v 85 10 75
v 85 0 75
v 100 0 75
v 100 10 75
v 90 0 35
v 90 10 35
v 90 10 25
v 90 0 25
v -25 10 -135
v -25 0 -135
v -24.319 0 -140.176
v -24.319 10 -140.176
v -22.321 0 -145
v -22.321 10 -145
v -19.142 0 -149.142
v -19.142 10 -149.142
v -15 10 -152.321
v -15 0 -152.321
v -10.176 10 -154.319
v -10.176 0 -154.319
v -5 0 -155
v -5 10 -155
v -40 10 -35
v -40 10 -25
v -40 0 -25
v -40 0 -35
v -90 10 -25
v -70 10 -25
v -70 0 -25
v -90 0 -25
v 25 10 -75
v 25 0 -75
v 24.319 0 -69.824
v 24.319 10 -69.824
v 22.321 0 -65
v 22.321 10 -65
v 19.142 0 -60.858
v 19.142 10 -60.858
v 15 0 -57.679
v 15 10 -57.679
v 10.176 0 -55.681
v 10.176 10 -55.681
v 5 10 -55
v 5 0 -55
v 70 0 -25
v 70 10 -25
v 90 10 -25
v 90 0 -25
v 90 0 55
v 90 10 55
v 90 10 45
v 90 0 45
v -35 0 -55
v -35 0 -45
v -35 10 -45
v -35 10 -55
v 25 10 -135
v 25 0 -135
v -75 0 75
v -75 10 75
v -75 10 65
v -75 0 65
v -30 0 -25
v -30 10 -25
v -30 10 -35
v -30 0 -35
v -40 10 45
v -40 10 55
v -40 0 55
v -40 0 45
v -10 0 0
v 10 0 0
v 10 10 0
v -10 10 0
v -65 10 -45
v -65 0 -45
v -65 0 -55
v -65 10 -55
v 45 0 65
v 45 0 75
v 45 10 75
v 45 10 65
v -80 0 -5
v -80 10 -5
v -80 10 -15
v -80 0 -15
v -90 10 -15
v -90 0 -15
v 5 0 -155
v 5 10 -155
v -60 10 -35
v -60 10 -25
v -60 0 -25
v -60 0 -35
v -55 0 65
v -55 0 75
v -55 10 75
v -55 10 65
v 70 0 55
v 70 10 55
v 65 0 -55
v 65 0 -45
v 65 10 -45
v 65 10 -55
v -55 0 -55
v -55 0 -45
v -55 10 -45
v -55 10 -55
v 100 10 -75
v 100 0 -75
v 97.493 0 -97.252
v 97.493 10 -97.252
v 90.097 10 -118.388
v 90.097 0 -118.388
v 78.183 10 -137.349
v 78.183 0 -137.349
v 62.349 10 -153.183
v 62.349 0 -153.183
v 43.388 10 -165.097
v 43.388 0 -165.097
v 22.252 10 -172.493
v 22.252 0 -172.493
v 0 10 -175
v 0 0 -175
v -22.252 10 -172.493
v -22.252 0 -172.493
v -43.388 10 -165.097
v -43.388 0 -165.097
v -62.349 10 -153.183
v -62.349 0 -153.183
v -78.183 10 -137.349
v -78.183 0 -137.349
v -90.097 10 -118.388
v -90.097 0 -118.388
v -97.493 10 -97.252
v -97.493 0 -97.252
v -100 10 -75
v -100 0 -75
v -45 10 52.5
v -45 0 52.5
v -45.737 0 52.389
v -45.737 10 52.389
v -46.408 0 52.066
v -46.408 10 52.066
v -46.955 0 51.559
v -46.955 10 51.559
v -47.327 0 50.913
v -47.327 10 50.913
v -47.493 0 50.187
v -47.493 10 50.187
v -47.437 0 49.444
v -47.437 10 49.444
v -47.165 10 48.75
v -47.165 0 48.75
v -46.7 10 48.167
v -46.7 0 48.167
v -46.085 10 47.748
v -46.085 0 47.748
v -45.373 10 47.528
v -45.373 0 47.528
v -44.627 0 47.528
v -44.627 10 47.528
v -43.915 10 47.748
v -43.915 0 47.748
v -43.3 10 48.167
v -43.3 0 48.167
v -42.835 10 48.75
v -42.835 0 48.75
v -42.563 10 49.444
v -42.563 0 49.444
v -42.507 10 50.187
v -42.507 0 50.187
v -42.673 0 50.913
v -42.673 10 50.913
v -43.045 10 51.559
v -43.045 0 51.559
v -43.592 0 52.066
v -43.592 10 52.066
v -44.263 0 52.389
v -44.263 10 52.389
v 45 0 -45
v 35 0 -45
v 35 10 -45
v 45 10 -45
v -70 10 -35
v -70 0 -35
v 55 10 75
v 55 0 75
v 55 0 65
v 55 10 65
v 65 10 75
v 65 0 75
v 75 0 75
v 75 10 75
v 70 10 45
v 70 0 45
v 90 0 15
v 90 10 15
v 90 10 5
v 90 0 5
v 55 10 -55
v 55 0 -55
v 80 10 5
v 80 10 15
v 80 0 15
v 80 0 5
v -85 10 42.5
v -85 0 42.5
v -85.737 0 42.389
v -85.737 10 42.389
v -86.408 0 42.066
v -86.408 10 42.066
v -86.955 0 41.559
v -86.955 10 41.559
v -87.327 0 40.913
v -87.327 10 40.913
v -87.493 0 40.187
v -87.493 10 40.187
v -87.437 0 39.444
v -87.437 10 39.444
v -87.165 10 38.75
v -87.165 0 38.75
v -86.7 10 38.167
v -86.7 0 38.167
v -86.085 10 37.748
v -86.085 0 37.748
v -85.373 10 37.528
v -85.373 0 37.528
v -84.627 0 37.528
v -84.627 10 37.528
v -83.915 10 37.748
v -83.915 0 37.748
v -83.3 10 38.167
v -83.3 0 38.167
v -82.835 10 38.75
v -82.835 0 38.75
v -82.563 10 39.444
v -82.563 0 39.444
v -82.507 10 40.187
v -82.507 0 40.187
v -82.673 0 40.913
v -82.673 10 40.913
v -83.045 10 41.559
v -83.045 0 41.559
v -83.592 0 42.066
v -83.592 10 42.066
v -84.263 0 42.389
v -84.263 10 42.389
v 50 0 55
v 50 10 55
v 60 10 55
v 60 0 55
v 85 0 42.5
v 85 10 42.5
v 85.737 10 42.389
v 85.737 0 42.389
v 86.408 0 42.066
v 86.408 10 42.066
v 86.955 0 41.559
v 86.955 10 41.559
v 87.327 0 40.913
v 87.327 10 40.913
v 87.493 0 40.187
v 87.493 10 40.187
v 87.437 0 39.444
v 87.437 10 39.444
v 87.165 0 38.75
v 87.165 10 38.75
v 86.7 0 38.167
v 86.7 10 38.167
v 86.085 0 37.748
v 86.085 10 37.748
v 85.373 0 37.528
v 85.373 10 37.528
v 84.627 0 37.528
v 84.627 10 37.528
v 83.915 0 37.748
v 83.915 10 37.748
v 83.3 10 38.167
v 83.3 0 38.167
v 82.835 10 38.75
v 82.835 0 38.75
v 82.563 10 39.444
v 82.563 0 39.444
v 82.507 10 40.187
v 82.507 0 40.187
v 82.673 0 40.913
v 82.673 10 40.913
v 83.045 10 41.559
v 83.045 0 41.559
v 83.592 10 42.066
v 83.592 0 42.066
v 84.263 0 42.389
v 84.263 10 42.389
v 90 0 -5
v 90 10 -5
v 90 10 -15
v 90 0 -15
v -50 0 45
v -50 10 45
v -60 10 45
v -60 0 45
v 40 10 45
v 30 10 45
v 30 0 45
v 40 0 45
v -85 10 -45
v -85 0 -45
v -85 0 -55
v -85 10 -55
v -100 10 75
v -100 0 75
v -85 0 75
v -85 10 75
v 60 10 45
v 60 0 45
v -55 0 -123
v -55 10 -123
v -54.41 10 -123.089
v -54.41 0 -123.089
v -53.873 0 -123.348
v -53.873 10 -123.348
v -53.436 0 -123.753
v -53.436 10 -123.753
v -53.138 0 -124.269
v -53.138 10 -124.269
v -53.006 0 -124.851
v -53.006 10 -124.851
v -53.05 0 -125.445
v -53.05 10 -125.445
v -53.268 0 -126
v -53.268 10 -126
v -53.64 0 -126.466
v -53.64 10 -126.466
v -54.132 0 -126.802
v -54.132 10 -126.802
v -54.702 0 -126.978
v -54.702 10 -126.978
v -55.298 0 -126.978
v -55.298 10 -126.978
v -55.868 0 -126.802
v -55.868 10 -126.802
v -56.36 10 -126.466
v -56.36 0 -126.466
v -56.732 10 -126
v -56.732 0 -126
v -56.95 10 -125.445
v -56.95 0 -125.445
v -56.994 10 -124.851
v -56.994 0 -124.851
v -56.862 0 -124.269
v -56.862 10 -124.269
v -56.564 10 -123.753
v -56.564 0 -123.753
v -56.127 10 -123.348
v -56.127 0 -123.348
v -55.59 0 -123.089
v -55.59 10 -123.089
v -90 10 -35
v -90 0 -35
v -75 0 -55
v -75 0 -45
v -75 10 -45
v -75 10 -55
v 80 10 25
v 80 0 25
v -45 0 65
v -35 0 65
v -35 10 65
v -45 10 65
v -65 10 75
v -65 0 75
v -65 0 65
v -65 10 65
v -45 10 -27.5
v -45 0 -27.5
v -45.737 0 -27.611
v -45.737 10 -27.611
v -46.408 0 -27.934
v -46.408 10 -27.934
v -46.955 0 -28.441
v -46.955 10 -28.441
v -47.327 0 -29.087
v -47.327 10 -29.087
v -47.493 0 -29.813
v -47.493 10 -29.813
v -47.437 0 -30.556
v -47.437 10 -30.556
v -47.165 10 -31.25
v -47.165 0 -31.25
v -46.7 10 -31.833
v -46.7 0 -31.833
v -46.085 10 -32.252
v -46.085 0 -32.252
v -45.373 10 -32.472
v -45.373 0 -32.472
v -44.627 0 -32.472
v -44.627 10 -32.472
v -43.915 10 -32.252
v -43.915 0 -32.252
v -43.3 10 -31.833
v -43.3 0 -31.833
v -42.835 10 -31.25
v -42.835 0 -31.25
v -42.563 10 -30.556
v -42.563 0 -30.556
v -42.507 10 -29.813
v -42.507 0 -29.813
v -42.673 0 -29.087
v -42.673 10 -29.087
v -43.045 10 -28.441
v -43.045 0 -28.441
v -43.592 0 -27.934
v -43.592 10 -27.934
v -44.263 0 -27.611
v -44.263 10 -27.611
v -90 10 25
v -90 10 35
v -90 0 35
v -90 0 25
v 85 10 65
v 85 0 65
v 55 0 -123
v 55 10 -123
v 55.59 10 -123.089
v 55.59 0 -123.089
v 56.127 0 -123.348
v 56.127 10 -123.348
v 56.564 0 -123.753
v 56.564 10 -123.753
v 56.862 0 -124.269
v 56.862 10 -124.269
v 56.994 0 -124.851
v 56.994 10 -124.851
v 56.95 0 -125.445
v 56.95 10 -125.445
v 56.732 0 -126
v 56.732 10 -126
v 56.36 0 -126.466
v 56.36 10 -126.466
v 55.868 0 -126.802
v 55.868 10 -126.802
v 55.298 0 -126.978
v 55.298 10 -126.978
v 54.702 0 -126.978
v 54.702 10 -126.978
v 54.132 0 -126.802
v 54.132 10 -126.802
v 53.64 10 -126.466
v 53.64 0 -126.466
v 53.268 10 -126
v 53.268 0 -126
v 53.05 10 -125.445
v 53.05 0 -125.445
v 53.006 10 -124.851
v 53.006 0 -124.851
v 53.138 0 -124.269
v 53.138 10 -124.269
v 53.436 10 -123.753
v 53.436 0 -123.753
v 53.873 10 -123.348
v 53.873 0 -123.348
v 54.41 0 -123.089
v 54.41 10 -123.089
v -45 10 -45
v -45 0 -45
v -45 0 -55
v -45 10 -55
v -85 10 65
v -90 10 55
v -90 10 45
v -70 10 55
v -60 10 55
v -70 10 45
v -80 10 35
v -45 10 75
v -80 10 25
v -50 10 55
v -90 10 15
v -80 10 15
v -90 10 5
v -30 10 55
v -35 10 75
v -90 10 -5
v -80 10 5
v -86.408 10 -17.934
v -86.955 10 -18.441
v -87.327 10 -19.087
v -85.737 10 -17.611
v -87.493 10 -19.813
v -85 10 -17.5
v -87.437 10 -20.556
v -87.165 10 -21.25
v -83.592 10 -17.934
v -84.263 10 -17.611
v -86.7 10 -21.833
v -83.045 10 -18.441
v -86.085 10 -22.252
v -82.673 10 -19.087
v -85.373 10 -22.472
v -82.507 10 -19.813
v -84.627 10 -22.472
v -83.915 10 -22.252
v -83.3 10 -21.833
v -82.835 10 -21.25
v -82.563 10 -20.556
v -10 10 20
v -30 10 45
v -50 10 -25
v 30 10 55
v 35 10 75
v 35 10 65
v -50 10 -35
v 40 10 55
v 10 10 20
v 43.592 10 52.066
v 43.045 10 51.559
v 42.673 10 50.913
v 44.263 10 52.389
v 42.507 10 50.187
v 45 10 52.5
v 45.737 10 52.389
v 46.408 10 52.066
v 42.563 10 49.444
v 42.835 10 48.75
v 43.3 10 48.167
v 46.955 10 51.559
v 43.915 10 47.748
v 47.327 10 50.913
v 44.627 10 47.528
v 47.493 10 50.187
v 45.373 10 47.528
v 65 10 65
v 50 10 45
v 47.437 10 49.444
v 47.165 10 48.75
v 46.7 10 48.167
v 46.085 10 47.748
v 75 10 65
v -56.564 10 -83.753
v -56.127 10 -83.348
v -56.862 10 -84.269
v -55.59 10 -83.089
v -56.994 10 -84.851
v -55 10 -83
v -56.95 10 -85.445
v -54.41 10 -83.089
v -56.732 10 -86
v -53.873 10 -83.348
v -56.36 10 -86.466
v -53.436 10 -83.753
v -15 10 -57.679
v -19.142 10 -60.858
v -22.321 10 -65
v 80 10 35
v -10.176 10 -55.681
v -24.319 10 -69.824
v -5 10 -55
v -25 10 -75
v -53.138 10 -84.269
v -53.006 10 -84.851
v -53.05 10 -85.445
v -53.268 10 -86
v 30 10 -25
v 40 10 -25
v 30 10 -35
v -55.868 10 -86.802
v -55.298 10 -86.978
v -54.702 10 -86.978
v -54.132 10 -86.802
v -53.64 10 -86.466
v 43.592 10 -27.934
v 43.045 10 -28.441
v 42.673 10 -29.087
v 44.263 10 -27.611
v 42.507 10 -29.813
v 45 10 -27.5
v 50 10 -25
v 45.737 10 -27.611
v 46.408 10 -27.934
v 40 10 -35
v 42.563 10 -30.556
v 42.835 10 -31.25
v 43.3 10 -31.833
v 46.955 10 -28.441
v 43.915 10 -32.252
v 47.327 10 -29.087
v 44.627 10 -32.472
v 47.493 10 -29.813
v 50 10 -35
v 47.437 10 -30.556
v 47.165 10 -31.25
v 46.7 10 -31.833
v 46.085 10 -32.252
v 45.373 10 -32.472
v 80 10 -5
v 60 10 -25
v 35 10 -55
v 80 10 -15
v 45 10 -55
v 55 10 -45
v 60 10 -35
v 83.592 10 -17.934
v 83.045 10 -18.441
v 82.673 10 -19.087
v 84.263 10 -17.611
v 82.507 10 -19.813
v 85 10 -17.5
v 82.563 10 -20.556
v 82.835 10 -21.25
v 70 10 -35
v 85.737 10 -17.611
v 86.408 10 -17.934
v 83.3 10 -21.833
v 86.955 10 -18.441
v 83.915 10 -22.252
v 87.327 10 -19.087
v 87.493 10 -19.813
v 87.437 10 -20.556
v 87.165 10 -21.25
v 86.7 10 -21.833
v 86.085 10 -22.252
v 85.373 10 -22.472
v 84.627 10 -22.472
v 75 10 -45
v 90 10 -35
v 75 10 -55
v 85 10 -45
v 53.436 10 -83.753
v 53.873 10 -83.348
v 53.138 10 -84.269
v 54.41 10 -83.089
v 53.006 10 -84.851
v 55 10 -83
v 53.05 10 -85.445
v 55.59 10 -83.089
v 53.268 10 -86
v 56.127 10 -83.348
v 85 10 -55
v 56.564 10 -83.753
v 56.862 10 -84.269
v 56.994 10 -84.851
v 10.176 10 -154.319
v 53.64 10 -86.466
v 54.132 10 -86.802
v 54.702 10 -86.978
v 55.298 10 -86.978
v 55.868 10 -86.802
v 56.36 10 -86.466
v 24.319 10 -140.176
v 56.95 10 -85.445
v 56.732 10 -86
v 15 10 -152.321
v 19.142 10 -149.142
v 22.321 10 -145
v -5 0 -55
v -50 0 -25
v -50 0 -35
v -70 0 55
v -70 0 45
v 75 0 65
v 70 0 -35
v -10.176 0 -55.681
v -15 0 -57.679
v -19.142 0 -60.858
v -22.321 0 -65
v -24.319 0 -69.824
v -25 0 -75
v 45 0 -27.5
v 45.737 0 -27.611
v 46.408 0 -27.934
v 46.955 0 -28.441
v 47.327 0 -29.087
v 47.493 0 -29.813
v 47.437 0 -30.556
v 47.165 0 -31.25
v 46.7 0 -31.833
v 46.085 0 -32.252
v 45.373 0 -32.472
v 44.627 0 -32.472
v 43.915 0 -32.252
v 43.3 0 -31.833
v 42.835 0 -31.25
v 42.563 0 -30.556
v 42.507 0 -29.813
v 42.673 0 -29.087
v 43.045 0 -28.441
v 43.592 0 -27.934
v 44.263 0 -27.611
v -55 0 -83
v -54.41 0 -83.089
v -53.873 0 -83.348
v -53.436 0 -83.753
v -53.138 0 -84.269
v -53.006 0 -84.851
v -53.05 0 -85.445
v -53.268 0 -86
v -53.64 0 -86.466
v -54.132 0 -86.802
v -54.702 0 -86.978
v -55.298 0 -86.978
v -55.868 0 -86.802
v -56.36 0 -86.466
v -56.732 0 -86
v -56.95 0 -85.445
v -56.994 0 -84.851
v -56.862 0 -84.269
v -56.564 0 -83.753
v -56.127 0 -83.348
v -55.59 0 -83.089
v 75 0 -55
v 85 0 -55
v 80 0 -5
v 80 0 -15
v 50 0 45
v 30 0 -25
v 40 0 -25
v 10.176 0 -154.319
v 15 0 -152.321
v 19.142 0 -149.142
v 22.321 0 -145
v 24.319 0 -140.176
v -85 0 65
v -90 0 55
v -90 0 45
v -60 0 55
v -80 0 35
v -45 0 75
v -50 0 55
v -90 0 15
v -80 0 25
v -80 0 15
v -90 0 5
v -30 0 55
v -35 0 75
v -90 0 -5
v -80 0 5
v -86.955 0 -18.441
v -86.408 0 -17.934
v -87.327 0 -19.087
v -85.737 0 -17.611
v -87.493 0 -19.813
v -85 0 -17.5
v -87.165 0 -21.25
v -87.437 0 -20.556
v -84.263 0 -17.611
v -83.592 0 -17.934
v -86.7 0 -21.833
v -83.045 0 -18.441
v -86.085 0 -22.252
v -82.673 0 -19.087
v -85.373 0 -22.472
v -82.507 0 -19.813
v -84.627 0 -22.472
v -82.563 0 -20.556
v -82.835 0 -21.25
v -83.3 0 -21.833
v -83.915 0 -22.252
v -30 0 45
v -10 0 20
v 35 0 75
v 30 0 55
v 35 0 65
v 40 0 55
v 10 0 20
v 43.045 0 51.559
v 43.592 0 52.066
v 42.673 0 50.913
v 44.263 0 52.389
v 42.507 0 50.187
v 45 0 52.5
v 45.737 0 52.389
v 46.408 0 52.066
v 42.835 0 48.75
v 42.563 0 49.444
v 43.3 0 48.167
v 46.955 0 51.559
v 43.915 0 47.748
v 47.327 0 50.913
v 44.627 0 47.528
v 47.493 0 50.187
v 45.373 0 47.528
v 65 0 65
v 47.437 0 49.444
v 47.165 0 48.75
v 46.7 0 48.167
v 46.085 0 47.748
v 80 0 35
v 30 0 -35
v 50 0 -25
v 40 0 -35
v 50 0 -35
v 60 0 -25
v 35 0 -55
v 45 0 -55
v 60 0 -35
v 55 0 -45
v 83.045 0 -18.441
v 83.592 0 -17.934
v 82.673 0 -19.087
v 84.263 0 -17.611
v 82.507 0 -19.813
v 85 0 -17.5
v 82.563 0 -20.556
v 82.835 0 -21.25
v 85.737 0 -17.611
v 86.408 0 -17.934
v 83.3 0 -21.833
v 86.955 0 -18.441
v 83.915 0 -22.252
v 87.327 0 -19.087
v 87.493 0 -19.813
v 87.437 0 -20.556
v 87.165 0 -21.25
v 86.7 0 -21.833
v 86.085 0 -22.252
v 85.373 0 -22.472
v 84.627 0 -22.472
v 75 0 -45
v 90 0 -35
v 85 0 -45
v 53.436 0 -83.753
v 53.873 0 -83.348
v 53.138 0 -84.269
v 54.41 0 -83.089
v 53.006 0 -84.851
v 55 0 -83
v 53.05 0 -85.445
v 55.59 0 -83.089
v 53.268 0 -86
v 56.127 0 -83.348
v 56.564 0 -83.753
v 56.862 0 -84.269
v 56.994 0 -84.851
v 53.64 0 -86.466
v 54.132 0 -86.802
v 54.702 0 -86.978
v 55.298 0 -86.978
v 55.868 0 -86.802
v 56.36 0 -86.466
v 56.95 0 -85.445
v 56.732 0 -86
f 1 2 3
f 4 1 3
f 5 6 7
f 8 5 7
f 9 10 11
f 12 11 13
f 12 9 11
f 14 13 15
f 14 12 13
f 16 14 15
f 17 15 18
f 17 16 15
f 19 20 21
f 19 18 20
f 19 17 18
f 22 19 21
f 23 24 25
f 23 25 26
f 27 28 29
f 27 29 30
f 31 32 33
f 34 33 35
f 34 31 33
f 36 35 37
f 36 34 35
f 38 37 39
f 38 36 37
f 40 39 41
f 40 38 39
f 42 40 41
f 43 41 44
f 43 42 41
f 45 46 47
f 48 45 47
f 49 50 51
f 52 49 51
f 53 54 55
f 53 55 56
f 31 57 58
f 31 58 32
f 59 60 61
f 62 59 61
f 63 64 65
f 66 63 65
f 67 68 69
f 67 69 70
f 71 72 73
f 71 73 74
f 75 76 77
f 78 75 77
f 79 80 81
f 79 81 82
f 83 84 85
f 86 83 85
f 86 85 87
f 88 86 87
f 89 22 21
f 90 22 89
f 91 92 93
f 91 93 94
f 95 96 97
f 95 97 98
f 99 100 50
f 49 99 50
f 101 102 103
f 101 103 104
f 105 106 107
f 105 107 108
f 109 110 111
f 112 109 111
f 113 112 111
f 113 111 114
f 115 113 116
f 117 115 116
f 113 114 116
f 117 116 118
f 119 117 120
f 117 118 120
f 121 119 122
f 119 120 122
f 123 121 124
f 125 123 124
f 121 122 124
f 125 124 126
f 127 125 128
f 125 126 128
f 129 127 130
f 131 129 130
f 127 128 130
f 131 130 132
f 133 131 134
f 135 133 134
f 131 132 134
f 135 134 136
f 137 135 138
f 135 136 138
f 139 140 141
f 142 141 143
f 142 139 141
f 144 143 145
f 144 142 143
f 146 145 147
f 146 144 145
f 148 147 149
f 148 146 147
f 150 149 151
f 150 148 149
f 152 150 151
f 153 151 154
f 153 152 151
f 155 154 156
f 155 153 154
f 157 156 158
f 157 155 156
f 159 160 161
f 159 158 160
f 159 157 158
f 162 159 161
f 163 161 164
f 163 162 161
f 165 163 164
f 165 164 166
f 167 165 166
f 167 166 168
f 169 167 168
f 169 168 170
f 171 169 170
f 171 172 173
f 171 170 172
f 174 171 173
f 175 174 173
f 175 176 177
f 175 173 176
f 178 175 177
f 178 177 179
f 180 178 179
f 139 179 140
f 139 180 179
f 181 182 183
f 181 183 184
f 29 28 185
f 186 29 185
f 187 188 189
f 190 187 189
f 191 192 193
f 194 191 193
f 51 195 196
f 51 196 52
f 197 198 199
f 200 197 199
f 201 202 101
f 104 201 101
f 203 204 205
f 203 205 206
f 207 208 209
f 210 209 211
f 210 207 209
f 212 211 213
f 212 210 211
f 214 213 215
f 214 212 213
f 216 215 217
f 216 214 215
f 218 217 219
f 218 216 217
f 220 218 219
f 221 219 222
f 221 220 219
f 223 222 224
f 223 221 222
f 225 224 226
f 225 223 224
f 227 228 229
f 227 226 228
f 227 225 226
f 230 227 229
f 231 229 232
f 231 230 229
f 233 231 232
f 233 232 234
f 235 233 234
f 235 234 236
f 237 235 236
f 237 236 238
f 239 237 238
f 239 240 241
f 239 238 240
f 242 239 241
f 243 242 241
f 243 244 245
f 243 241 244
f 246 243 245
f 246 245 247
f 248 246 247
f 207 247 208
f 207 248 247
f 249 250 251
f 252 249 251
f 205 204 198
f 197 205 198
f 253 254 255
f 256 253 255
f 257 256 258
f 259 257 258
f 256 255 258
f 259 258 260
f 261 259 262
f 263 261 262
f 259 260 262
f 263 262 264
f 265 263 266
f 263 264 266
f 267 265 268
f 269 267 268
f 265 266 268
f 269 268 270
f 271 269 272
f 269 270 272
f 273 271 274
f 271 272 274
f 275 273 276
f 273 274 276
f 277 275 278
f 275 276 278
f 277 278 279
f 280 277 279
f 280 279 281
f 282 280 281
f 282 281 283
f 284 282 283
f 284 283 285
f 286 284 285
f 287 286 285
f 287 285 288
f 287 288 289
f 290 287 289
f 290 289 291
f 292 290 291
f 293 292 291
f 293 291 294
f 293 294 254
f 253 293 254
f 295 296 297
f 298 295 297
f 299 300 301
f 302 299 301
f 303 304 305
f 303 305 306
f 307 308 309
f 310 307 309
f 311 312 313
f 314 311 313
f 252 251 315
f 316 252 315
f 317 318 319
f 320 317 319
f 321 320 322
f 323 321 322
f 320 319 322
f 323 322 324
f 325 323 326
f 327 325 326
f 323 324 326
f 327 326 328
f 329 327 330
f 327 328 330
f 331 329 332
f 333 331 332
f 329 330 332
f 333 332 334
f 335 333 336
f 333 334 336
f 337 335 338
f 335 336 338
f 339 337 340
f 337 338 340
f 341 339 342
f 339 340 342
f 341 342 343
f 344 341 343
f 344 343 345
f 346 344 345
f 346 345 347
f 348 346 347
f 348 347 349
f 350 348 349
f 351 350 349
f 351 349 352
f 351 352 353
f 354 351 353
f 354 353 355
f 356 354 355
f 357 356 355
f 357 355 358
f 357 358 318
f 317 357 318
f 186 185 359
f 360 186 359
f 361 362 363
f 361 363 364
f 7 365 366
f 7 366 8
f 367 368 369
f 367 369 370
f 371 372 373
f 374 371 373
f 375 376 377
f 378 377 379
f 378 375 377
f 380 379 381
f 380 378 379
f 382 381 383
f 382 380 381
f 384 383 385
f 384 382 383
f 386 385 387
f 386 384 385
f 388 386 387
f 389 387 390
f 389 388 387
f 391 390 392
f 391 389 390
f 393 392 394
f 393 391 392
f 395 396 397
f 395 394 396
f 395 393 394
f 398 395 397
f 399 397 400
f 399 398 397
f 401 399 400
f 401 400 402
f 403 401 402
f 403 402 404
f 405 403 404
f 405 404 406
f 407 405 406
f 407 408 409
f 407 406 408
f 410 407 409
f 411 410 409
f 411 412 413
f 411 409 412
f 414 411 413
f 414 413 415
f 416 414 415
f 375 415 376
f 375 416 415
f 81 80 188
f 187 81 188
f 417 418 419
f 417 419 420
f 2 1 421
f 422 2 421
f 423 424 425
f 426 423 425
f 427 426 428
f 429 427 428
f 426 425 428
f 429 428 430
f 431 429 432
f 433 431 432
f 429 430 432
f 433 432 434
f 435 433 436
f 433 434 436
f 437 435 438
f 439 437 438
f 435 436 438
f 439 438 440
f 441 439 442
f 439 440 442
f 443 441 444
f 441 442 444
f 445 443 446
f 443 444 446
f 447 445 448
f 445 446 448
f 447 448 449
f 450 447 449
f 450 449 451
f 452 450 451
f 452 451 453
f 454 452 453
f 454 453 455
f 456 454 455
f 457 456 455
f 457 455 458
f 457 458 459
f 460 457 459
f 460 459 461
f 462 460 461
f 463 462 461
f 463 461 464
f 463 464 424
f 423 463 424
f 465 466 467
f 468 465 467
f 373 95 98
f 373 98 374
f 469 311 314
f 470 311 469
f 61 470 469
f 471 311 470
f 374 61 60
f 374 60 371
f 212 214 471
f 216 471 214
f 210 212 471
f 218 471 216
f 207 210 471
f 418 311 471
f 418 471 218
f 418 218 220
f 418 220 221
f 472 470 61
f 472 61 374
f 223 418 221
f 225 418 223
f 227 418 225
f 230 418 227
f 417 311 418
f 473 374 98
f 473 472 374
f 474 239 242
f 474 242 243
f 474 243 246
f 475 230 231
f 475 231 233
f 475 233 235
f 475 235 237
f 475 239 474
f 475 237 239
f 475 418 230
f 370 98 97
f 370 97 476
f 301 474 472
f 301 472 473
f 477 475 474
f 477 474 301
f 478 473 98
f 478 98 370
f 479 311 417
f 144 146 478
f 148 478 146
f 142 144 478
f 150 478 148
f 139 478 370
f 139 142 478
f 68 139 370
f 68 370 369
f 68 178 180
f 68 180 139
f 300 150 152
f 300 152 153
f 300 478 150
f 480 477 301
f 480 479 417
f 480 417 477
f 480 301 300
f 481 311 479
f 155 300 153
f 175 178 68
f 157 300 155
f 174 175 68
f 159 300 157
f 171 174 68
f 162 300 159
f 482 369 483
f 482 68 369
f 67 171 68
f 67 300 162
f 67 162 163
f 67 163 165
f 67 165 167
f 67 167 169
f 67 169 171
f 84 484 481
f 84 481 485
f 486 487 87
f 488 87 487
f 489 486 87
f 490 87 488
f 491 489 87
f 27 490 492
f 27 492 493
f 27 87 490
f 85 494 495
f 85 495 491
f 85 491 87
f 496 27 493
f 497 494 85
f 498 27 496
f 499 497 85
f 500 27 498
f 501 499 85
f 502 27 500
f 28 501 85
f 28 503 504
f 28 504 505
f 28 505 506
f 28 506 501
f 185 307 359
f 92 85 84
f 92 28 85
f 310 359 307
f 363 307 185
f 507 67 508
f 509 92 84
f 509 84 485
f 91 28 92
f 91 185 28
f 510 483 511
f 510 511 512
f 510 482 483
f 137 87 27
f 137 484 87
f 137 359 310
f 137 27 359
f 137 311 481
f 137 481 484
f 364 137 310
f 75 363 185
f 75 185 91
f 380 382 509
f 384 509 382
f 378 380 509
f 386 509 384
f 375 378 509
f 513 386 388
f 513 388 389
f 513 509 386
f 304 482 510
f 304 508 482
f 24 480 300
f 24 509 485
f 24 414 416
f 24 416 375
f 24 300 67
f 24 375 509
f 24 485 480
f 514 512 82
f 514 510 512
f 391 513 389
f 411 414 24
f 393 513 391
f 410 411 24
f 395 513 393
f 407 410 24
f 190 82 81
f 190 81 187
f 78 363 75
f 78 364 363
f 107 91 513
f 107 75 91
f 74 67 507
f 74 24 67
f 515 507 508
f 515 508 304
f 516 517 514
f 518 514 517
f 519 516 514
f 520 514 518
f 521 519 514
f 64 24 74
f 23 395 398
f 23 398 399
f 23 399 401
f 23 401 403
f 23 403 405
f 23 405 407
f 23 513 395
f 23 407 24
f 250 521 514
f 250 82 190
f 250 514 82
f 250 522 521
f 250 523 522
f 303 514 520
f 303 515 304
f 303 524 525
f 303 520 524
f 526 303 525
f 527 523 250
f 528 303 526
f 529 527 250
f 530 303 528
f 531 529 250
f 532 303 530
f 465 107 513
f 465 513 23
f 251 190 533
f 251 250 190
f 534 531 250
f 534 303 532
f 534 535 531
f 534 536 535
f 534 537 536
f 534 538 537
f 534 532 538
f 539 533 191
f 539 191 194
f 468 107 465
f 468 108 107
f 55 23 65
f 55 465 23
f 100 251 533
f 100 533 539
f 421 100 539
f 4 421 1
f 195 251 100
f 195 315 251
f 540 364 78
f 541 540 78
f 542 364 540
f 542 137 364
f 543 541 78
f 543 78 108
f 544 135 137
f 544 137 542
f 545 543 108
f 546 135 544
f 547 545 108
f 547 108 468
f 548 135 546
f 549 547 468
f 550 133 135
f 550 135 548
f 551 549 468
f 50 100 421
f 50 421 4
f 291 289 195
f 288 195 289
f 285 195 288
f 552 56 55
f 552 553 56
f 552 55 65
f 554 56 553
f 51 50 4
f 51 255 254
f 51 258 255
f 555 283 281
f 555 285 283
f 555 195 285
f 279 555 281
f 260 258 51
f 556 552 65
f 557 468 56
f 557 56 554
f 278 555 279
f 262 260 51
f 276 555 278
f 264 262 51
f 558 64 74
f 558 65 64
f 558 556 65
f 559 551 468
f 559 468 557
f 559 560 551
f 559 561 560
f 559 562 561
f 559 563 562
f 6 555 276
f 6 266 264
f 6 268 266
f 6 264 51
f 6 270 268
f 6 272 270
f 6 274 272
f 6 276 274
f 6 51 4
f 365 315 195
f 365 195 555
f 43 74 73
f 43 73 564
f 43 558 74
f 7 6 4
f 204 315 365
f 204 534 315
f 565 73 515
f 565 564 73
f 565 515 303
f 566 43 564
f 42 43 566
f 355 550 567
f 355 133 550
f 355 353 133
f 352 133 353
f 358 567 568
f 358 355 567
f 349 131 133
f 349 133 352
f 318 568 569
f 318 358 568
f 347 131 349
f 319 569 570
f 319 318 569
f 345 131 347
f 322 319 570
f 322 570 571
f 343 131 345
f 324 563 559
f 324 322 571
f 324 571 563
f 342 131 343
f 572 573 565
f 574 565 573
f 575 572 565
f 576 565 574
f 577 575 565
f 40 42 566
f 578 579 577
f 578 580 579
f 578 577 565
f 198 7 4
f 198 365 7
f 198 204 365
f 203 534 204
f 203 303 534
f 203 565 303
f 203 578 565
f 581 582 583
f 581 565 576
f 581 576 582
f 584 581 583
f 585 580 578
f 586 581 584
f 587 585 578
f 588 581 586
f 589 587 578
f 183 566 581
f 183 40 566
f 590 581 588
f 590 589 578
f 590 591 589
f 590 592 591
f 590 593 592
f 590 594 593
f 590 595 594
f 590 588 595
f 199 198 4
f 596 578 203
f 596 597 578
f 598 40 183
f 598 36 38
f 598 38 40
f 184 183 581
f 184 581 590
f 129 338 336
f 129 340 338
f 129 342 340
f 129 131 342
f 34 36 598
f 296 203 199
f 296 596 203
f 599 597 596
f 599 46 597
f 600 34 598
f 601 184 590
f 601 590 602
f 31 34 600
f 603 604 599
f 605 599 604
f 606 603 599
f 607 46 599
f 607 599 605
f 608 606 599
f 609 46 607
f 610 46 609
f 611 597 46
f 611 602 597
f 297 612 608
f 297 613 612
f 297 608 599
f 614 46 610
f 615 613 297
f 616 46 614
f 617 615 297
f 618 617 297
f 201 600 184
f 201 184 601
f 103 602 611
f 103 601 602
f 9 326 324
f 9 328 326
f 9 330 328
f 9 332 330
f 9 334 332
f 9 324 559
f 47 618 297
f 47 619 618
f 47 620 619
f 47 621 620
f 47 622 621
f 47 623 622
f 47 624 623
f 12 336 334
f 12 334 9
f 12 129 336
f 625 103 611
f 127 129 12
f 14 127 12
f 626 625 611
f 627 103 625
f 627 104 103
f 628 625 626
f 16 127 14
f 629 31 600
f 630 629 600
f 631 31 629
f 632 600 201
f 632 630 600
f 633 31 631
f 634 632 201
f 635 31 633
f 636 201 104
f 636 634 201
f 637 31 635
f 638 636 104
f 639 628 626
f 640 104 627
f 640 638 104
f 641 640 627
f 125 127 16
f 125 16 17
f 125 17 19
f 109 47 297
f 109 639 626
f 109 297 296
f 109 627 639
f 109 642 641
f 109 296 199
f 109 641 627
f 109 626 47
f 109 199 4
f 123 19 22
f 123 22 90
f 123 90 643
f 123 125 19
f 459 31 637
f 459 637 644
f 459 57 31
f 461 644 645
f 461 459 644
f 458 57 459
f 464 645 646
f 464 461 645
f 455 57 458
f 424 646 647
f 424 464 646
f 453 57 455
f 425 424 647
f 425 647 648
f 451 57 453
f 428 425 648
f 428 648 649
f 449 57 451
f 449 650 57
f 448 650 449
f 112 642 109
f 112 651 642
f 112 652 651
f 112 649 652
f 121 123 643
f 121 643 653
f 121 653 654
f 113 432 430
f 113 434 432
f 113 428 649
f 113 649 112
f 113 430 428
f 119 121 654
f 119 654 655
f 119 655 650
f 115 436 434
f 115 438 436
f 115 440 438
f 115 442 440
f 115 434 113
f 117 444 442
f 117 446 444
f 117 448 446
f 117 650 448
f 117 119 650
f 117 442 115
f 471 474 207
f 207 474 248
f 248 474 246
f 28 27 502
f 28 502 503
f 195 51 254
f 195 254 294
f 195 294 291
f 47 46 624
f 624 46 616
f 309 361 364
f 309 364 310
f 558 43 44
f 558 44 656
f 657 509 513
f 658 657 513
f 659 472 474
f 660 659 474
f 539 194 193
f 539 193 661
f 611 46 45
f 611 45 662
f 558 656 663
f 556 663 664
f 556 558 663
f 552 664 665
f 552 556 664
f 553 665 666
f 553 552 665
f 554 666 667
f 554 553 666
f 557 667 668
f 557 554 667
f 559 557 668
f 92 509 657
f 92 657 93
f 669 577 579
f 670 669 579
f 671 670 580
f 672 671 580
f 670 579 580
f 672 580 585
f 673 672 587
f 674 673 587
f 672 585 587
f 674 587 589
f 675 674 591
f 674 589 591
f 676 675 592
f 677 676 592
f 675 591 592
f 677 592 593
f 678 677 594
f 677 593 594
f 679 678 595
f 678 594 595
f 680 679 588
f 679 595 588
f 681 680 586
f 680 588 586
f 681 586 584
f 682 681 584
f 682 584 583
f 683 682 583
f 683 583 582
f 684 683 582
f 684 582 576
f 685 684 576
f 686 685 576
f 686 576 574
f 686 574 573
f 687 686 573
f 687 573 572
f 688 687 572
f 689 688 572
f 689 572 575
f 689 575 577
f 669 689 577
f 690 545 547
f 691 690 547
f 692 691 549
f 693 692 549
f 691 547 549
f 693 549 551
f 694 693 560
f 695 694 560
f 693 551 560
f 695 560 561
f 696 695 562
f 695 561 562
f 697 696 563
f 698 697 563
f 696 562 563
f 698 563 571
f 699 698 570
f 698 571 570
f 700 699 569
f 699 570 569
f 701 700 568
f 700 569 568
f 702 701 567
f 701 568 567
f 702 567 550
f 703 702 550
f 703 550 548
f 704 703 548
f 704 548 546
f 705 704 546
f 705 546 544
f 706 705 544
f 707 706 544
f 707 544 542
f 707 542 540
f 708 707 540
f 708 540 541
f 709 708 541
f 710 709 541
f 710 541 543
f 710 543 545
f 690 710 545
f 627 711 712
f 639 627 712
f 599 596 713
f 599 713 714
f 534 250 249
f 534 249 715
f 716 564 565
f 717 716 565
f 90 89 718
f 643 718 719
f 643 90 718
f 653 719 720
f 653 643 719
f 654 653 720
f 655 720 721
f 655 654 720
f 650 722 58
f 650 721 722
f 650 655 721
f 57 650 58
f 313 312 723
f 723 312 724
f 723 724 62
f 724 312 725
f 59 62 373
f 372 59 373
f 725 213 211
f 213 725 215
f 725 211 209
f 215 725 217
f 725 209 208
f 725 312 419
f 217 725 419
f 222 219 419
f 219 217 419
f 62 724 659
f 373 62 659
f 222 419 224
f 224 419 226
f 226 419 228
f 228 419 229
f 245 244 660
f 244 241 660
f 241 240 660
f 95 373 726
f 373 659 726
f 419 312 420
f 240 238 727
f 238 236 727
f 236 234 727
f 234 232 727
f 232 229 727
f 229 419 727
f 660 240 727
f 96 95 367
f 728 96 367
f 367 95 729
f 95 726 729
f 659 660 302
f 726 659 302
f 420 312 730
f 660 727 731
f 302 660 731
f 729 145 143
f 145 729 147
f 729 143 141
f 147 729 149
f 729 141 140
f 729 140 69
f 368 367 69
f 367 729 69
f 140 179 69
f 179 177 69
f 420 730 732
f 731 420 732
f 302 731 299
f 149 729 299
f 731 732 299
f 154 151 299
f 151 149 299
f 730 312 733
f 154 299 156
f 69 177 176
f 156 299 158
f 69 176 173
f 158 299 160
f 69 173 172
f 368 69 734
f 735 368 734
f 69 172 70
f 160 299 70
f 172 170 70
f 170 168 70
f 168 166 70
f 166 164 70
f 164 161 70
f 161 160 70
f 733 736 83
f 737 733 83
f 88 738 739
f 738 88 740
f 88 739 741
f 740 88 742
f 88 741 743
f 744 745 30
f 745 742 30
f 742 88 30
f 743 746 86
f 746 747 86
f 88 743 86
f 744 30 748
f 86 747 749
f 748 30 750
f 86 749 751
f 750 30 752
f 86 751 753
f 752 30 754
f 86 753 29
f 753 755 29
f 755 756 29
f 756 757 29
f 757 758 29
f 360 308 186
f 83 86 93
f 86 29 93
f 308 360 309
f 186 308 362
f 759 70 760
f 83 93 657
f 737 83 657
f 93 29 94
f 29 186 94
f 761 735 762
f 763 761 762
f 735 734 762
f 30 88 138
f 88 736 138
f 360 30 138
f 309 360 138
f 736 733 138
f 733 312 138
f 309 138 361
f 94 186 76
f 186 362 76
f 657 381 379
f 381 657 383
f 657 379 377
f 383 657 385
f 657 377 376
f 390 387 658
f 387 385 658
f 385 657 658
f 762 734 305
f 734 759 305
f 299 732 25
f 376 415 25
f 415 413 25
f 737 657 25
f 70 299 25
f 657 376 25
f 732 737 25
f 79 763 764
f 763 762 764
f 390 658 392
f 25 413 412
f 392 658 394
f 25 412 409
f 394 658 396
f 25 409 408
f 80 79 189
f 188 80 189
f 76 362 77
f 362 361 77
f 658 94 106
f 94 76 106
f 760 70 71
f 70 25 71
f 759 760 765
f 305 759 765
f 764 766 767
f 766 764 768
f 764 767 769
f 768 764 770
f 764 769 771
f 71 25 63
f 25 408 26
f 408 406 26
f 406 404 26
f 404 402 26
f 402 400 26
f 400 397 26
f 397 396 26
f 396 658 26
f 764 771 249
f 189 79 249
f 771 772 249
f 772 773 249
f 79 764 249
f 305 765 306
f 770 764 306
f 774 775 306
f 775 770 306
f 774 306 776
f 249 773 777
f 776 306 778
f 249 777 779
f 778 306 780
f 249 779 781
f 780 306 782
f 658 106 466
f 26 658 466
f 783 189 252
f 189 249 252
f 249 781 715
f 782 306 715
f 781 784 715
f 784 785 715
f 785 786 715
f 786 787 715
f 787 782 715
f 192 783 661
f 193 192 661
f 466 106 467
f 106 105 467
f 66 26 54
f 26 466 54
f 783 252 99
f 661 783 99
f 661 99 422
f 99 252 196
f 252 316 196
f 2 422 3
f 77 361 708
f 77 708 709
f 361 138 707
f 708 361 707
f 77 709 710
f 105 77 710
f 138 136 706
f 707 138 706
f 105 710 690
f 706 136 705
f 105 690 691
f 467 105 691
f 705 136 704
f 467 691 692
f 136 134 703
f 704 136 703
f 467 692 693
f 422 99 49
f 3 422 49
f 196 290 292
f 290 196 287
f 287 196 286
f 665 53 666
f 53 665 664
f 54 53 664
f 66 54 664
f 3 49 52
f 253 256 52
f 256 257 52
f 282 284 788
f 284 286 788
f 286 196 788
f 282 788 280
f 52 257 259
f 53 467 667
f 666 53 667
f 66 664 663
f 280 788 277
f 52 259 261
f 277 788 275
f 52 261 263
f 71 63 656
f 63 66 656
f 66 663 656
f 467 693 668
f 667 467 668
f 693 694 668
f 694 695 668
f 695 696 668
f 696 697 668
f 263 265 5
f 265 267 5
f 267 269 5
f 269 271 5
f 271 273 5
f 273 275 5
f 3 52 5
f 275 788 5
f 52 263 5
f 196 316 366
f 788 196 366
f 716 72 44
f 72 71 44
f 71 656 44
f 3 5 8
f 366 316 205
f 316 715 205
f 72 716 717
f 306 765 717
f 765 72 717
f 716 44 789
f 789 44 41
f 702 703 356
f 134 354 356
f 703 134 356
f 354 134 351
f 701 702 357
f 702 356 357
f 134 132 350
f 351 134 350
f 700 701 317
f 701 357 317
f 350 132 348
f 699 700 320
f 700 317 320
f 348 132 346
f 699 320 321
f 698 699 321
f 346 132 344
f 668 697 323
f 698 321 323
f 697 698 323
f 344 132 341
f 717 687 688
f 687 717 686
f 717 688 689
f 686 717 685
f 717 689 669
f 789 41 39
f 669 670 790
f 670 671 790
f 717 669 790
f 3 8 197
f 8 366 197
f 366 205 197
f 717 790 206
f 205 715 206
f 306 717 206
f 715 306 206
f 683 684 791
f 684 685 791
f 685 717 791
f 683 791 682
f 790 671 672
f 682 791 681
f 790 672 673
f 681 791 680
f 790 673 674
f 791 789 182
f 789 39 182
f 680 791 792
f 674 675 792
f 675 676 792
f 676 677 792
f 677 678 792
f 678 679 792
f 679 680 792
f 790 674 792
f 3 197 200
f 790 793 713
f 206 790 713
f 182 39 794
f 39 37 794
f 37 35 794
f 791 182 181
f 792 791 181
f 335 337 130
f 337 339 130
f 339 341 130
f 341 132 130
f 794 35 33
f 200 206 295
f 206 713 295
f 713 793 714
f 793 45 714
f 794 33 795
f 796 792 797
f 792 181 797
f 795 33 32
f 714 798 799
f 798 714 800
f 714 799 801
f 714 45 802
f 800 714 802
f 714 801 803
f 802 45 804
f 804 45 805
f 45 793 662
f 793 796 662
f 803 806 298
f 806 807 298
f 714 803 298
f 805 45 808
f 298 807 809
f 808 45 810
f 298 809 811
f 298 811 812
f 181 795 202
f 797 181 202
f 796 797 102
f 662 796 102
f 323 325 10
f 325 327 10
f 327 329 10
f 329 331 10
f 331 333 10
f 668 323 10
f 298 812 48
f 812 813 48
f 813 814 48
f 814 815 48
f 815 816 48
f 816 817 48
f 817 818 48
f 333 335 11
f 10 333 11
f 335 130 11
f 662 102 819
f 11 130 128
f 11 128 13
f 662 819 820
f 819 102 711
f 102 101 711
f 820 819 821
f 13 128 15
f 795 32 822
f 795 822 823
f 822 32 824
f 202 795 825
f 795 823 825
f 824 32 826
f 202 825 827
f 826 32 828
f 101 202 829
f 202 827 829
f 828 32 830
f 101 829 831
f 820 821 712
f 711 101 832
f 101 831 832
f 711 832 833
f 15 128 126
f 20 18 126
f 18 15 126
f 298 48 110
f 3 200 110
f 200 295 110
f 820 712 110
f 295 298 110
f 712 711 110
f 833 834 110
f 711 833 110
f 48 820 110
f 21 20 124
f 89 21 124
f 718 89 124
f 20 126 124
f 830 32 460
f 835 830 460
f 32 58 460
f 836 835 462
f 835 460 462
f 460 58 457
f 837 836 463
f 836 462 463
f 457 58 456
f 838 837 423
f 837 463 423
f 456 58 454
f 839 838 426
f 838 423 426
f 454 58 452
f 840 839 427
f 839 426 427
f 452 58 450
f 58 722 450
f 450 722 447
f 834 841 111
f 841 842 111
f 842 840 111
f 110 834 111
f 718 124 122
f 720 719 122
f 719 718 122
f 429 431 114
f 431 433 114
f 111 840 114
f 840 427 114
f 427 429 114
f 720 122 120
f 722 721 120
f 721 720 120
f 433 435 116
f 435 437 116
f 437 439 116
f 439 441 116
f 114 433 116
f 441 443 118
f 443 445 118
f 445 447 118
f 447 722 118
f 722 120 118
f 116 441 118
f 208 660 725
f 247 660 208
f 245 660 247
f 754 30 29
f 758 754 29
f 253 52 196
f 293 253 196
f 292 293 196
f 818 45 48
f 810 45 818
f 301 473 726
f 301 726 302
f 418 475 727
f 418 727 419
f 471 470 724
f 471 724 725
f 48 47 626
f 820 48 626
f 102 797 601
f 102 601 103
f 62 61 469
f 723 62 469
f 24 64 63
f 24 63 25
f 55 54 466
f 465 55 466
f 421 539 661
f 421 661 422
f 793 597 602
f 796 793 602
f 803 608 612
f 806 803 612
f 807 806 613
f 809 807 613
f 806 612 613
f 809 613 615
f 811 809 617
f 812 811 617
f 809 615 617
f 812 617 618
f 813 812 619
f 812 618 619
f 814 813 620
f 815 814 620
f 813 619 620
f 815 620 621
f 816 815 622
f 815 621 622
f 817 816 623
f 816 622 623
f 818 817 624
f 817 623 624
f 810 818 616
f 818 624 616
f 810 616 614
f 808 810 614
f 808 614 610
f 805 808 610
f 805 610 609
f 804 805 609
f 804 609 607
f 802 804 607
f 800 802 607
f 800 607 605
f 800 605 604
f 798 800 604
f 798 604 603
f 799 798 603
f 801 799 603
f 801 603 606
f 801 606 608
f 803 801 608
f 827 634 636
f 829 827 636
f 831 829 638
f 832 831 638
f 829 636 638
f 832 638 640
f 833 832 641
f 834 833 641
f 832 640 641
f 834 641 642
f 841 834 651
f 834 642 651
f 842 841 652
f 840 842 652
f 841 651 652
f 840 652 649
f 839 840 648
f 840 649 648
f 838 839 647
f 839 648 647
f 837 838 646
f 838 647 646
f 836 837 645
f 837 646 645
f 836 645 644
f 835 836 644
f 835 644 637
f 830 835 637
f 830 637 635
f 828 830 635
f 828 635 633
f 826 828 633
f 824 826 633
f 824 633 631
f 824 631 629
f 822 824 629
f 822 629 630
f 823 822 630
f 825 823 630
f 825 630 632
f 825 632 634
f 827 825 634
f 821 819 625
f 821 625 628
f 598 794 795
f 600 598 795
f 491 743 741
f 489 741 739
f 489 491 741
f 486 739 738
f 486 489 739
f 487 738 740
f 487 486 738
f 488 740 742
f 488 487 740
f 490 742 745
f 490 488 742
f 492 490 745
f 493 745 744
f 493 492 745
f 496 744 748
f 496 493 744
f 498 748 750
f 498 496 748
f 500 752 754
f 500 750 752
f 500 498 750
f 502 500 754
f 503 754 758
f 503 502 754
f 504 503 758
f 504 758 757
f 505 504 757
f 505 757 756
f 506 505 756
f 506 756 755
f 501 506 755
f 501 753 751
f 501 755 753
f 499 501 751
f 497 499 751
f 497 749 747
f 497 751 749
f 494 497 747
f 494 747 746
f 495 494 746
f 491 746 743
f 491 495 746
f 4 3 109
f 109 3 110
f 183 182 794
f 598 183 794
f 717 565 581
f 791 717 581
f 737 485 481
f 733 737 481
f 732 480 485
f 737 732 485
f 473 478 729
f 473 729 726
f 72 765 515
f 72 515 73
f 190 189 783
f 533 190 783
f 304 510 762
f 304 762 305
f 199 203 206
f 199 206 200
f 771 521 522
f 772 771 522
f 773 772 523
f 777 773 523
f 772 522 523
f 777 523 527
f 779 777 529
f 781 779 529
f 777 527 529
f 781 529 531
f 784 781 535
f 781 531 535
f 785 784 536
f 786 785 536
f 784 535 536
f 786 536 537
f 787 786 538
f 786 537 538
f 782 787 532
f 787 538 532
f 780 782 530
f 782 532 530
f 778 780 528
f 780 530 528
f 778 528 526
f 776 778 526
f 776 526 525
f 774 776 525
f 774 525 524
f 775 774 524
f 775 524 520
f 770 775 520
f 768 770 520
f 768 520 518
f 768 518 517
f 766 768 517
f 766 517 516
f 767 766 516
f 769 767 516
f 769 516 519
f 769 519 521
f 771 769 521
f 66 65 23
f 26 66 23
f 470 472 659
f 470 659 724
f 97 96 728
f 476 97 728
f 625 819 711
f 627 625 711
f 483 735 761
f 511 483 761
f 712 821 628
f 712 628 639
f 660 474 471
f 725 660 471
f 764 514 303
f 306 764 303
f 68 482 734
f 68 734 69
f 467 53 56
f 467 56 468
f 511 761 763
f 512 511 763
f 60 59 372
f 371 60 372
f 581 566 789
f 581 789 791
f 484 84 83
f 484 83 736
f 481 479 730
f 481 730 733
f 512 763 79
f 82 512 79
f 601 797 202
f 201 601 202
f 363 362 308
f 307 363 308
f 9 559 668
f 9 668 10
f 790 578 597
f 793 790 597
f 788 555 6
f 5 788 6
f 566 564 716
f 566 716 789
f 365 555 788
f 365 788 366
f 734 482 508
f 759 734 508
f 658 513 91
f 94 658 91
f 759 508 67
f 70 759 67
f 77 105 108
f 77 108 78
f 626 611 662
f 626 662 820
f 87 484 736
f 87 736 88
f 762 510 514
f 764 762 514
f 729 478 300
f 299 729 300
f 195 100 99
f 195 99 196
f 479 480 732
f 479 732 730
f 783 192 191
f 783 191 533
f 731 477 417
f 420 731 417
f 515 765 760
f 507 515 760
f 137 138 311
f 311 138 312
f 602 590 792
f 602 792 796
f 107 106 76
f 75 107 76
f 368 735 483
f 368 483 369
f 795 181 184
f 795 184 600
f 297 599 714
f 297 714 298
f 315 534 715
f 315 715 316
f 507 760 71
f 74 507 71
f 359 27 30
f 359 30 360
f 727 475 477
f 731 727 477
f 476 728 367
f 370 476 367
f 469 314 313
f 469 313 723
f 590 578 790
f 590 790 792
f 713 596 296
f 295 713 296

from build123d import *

# Parameters (mm, degrees)
BOSS_EXTRUDE1_DEPTH = 10
SKETCH2_R           = 2.5
SKETCH2_W           = 10
SKETCH2_H           = 10
SKETCH2_W_2         = 20
CUT_EXTRUDE1_DEPTH  = 202.804360706
SKETCH4_R           = 2
CUT_EXTRUDE2_DEPTH  = 202.804360706
SKETCH5_W           = 10
SKETCH5_H           = 10
SKETCH5_H_2         = 20
CUT_EXTRUDE3_DEPTH  = 202.804360706


with BuildPart() as part:
    # Sketch3 → Boss-Extrude1 (new body)
    with BuildSketch(Plane(origin=(0, 0, 0), x_dir=(1, 0, 0), z_dir=(0, 1, 0))):
        with BuildLine():
            Line((-100, -75), (100, -75))
            Line((100, -75), (100, 75))
            ThreePointArc((100, 75), (0, 175), (-100, 75))
            Line((-100, 75), (-100, -75))
        make_face()
    extrude(amount=BOSS_EXTRUDE1_DEPTH)

    # Sketch2 → Cut-Extrude1 (cut, through all)
    with BuildSketch(Plane(origin=(0, 10, 0), x_dir=(1, 0, 0), z_dir=(0, 1, 0))):
        with Locations(Location((45, 30, 0), (0, 0, 270))):
            Circle(SKETCH2_R)
        with Locations(Location((45, -50, 0), (0, 0, 270))):
            Circle(SKETCH2_R)
        with Locations(Location((85, -40, 0), (0, 0, 270))):
            Circle(SKETCH2_R)
        with Locations(Location((85, 20, 0), (0, 0, 270))):
            Circle(SKETCH2_R)
        with Locations((35, -50)):
            Rectangle(SKETCH2_W, SKETCH2_H)
        with Locations((55, -50)):
            Rectangle(SKETCH2_W, SKETCH2_H)
        with Locations((80, -50)):
            Rectangle(SKETCH2_W_2, SKETCH2_H)
        with Locations((85, -30)):
            Rectangle(SKETCH2_W, SKETCH2_H)
        with Locations((85, -10)):
            Rectangle(SKETCH2_W, SKETCH2_H)
        with Locations((85, 10)):
            Rectangle(SKETCH2_W, SKETCH2_H)
        with Locations((80, 30)):
            Rectangle(SKETCH2_W_2, SKETCH2_H)
        with Locations((55, 30)):
            Rectangle(SKETCH2_W, SKETCH2_H)
        with Locations((35, 30)):
            Rectangle(SKETCH2_W, SKETCH2_H)
    cut_extrude1 = extrude(amount=-CUT_EXTRUDE1_DEPTH, mode=Mode.SUBTRACT)

    # Mirror1: Cut-Extrude1 across plane
    add(cut_extrude1.mirror(Plane(origin=(0, 0, 0), x_dir=(0, 0, 1), z_dir=(1, 0, 0))), mode=Mode.SUBTRACT)

    # Sketch4 → Cut-Extrude2 (cut, through all)
    with BuildSketch(Plane(origin=(0, 10, 0), x_dir=(1, 0, 0), z_dir=(0, 1, 0))):
        with Locations(Location((55, 125, 0), (0, 0, 270))):
            Circle(SKETCH4_R)
        with Locations(Location((55, 85, 0), (0, 0, 270))):
            Circle(SKETCH4_R)
        with Locations(Location((-55, 125, 0), (0, 0, 270))):
            Circle(SKETCH4_R)
        with Locations(Location((-55, 85, 0), (0, 0, 270))):
            Circle(SKETCH4_R)
        with BuildLine():
            Line((-5, 155), (5, 155))
            ThreePointArc((5, 155), (19.142135624, 149.142135624), (25, 135))
            Line((25, 135), (25, 75))
            ThreePointArc((25, 75), (19.142135624, 60.857864376), (5, 55))
            Line((5, 55), (-5, 55))
            ThreePointArc((-5, 55), (-19.142135624, 60.857864376), (-25, 75))
            Line((-25, 75), (-25, 135))
            ThreePointArc((-25, 135), (-19.142135624, 149.142135624), (-5, 155))
        make_face()
    extrude(amount=-CUT_EXTRUDE2_DEPTH, mode=Mode.SUBTRACT)

    # Sketch5 → Cut-Extrude3 (cut, symmetric)
    with BuildSketch(Plane(origin=(0, 10, 0), x_dir=(1, 0, 0), z_dir=(0, 1, 0))):
        with Locations((80, 50)):
            Rectangle(SKETCH5_W, SKETCH5_H)
        with Locations((60, 50)):
            Rectangle(SKETCH5_W, SKETCH5_H)
        with Locations((40, 50)):
            Rectangle(SKETCH5_W, SKETCH5_H)
        with Locations((5, -10)):
            Rectangle(SKETCH5_W, SKETCH5_H_2)
        with Locations((40, -70)):
            Rectangle(SKETCH5_W, SKETCH5_H)
        with Locations((60, -70)):
            Rectangle(SKETCH5_W, SKETCH5_H)
        with Locations((80, -70)):
            Rectangle(SKETCH5_W, SKETCH5_H)
    cut_extrude3 = extrude(amount=CUT_EXTRUDE3_DEPTH, both=True, mode=Mode.SUBTRACT)

    # Mirror2: Cut-Extrude3 across plane
    add(cut_extrude3.mirror(Plane(origin=(0, 0, 0), x_dir=(0, 0, 1), z_dir=(1, 0, 0))), mode=Mode.SUBTRACT)


solid = part.part
